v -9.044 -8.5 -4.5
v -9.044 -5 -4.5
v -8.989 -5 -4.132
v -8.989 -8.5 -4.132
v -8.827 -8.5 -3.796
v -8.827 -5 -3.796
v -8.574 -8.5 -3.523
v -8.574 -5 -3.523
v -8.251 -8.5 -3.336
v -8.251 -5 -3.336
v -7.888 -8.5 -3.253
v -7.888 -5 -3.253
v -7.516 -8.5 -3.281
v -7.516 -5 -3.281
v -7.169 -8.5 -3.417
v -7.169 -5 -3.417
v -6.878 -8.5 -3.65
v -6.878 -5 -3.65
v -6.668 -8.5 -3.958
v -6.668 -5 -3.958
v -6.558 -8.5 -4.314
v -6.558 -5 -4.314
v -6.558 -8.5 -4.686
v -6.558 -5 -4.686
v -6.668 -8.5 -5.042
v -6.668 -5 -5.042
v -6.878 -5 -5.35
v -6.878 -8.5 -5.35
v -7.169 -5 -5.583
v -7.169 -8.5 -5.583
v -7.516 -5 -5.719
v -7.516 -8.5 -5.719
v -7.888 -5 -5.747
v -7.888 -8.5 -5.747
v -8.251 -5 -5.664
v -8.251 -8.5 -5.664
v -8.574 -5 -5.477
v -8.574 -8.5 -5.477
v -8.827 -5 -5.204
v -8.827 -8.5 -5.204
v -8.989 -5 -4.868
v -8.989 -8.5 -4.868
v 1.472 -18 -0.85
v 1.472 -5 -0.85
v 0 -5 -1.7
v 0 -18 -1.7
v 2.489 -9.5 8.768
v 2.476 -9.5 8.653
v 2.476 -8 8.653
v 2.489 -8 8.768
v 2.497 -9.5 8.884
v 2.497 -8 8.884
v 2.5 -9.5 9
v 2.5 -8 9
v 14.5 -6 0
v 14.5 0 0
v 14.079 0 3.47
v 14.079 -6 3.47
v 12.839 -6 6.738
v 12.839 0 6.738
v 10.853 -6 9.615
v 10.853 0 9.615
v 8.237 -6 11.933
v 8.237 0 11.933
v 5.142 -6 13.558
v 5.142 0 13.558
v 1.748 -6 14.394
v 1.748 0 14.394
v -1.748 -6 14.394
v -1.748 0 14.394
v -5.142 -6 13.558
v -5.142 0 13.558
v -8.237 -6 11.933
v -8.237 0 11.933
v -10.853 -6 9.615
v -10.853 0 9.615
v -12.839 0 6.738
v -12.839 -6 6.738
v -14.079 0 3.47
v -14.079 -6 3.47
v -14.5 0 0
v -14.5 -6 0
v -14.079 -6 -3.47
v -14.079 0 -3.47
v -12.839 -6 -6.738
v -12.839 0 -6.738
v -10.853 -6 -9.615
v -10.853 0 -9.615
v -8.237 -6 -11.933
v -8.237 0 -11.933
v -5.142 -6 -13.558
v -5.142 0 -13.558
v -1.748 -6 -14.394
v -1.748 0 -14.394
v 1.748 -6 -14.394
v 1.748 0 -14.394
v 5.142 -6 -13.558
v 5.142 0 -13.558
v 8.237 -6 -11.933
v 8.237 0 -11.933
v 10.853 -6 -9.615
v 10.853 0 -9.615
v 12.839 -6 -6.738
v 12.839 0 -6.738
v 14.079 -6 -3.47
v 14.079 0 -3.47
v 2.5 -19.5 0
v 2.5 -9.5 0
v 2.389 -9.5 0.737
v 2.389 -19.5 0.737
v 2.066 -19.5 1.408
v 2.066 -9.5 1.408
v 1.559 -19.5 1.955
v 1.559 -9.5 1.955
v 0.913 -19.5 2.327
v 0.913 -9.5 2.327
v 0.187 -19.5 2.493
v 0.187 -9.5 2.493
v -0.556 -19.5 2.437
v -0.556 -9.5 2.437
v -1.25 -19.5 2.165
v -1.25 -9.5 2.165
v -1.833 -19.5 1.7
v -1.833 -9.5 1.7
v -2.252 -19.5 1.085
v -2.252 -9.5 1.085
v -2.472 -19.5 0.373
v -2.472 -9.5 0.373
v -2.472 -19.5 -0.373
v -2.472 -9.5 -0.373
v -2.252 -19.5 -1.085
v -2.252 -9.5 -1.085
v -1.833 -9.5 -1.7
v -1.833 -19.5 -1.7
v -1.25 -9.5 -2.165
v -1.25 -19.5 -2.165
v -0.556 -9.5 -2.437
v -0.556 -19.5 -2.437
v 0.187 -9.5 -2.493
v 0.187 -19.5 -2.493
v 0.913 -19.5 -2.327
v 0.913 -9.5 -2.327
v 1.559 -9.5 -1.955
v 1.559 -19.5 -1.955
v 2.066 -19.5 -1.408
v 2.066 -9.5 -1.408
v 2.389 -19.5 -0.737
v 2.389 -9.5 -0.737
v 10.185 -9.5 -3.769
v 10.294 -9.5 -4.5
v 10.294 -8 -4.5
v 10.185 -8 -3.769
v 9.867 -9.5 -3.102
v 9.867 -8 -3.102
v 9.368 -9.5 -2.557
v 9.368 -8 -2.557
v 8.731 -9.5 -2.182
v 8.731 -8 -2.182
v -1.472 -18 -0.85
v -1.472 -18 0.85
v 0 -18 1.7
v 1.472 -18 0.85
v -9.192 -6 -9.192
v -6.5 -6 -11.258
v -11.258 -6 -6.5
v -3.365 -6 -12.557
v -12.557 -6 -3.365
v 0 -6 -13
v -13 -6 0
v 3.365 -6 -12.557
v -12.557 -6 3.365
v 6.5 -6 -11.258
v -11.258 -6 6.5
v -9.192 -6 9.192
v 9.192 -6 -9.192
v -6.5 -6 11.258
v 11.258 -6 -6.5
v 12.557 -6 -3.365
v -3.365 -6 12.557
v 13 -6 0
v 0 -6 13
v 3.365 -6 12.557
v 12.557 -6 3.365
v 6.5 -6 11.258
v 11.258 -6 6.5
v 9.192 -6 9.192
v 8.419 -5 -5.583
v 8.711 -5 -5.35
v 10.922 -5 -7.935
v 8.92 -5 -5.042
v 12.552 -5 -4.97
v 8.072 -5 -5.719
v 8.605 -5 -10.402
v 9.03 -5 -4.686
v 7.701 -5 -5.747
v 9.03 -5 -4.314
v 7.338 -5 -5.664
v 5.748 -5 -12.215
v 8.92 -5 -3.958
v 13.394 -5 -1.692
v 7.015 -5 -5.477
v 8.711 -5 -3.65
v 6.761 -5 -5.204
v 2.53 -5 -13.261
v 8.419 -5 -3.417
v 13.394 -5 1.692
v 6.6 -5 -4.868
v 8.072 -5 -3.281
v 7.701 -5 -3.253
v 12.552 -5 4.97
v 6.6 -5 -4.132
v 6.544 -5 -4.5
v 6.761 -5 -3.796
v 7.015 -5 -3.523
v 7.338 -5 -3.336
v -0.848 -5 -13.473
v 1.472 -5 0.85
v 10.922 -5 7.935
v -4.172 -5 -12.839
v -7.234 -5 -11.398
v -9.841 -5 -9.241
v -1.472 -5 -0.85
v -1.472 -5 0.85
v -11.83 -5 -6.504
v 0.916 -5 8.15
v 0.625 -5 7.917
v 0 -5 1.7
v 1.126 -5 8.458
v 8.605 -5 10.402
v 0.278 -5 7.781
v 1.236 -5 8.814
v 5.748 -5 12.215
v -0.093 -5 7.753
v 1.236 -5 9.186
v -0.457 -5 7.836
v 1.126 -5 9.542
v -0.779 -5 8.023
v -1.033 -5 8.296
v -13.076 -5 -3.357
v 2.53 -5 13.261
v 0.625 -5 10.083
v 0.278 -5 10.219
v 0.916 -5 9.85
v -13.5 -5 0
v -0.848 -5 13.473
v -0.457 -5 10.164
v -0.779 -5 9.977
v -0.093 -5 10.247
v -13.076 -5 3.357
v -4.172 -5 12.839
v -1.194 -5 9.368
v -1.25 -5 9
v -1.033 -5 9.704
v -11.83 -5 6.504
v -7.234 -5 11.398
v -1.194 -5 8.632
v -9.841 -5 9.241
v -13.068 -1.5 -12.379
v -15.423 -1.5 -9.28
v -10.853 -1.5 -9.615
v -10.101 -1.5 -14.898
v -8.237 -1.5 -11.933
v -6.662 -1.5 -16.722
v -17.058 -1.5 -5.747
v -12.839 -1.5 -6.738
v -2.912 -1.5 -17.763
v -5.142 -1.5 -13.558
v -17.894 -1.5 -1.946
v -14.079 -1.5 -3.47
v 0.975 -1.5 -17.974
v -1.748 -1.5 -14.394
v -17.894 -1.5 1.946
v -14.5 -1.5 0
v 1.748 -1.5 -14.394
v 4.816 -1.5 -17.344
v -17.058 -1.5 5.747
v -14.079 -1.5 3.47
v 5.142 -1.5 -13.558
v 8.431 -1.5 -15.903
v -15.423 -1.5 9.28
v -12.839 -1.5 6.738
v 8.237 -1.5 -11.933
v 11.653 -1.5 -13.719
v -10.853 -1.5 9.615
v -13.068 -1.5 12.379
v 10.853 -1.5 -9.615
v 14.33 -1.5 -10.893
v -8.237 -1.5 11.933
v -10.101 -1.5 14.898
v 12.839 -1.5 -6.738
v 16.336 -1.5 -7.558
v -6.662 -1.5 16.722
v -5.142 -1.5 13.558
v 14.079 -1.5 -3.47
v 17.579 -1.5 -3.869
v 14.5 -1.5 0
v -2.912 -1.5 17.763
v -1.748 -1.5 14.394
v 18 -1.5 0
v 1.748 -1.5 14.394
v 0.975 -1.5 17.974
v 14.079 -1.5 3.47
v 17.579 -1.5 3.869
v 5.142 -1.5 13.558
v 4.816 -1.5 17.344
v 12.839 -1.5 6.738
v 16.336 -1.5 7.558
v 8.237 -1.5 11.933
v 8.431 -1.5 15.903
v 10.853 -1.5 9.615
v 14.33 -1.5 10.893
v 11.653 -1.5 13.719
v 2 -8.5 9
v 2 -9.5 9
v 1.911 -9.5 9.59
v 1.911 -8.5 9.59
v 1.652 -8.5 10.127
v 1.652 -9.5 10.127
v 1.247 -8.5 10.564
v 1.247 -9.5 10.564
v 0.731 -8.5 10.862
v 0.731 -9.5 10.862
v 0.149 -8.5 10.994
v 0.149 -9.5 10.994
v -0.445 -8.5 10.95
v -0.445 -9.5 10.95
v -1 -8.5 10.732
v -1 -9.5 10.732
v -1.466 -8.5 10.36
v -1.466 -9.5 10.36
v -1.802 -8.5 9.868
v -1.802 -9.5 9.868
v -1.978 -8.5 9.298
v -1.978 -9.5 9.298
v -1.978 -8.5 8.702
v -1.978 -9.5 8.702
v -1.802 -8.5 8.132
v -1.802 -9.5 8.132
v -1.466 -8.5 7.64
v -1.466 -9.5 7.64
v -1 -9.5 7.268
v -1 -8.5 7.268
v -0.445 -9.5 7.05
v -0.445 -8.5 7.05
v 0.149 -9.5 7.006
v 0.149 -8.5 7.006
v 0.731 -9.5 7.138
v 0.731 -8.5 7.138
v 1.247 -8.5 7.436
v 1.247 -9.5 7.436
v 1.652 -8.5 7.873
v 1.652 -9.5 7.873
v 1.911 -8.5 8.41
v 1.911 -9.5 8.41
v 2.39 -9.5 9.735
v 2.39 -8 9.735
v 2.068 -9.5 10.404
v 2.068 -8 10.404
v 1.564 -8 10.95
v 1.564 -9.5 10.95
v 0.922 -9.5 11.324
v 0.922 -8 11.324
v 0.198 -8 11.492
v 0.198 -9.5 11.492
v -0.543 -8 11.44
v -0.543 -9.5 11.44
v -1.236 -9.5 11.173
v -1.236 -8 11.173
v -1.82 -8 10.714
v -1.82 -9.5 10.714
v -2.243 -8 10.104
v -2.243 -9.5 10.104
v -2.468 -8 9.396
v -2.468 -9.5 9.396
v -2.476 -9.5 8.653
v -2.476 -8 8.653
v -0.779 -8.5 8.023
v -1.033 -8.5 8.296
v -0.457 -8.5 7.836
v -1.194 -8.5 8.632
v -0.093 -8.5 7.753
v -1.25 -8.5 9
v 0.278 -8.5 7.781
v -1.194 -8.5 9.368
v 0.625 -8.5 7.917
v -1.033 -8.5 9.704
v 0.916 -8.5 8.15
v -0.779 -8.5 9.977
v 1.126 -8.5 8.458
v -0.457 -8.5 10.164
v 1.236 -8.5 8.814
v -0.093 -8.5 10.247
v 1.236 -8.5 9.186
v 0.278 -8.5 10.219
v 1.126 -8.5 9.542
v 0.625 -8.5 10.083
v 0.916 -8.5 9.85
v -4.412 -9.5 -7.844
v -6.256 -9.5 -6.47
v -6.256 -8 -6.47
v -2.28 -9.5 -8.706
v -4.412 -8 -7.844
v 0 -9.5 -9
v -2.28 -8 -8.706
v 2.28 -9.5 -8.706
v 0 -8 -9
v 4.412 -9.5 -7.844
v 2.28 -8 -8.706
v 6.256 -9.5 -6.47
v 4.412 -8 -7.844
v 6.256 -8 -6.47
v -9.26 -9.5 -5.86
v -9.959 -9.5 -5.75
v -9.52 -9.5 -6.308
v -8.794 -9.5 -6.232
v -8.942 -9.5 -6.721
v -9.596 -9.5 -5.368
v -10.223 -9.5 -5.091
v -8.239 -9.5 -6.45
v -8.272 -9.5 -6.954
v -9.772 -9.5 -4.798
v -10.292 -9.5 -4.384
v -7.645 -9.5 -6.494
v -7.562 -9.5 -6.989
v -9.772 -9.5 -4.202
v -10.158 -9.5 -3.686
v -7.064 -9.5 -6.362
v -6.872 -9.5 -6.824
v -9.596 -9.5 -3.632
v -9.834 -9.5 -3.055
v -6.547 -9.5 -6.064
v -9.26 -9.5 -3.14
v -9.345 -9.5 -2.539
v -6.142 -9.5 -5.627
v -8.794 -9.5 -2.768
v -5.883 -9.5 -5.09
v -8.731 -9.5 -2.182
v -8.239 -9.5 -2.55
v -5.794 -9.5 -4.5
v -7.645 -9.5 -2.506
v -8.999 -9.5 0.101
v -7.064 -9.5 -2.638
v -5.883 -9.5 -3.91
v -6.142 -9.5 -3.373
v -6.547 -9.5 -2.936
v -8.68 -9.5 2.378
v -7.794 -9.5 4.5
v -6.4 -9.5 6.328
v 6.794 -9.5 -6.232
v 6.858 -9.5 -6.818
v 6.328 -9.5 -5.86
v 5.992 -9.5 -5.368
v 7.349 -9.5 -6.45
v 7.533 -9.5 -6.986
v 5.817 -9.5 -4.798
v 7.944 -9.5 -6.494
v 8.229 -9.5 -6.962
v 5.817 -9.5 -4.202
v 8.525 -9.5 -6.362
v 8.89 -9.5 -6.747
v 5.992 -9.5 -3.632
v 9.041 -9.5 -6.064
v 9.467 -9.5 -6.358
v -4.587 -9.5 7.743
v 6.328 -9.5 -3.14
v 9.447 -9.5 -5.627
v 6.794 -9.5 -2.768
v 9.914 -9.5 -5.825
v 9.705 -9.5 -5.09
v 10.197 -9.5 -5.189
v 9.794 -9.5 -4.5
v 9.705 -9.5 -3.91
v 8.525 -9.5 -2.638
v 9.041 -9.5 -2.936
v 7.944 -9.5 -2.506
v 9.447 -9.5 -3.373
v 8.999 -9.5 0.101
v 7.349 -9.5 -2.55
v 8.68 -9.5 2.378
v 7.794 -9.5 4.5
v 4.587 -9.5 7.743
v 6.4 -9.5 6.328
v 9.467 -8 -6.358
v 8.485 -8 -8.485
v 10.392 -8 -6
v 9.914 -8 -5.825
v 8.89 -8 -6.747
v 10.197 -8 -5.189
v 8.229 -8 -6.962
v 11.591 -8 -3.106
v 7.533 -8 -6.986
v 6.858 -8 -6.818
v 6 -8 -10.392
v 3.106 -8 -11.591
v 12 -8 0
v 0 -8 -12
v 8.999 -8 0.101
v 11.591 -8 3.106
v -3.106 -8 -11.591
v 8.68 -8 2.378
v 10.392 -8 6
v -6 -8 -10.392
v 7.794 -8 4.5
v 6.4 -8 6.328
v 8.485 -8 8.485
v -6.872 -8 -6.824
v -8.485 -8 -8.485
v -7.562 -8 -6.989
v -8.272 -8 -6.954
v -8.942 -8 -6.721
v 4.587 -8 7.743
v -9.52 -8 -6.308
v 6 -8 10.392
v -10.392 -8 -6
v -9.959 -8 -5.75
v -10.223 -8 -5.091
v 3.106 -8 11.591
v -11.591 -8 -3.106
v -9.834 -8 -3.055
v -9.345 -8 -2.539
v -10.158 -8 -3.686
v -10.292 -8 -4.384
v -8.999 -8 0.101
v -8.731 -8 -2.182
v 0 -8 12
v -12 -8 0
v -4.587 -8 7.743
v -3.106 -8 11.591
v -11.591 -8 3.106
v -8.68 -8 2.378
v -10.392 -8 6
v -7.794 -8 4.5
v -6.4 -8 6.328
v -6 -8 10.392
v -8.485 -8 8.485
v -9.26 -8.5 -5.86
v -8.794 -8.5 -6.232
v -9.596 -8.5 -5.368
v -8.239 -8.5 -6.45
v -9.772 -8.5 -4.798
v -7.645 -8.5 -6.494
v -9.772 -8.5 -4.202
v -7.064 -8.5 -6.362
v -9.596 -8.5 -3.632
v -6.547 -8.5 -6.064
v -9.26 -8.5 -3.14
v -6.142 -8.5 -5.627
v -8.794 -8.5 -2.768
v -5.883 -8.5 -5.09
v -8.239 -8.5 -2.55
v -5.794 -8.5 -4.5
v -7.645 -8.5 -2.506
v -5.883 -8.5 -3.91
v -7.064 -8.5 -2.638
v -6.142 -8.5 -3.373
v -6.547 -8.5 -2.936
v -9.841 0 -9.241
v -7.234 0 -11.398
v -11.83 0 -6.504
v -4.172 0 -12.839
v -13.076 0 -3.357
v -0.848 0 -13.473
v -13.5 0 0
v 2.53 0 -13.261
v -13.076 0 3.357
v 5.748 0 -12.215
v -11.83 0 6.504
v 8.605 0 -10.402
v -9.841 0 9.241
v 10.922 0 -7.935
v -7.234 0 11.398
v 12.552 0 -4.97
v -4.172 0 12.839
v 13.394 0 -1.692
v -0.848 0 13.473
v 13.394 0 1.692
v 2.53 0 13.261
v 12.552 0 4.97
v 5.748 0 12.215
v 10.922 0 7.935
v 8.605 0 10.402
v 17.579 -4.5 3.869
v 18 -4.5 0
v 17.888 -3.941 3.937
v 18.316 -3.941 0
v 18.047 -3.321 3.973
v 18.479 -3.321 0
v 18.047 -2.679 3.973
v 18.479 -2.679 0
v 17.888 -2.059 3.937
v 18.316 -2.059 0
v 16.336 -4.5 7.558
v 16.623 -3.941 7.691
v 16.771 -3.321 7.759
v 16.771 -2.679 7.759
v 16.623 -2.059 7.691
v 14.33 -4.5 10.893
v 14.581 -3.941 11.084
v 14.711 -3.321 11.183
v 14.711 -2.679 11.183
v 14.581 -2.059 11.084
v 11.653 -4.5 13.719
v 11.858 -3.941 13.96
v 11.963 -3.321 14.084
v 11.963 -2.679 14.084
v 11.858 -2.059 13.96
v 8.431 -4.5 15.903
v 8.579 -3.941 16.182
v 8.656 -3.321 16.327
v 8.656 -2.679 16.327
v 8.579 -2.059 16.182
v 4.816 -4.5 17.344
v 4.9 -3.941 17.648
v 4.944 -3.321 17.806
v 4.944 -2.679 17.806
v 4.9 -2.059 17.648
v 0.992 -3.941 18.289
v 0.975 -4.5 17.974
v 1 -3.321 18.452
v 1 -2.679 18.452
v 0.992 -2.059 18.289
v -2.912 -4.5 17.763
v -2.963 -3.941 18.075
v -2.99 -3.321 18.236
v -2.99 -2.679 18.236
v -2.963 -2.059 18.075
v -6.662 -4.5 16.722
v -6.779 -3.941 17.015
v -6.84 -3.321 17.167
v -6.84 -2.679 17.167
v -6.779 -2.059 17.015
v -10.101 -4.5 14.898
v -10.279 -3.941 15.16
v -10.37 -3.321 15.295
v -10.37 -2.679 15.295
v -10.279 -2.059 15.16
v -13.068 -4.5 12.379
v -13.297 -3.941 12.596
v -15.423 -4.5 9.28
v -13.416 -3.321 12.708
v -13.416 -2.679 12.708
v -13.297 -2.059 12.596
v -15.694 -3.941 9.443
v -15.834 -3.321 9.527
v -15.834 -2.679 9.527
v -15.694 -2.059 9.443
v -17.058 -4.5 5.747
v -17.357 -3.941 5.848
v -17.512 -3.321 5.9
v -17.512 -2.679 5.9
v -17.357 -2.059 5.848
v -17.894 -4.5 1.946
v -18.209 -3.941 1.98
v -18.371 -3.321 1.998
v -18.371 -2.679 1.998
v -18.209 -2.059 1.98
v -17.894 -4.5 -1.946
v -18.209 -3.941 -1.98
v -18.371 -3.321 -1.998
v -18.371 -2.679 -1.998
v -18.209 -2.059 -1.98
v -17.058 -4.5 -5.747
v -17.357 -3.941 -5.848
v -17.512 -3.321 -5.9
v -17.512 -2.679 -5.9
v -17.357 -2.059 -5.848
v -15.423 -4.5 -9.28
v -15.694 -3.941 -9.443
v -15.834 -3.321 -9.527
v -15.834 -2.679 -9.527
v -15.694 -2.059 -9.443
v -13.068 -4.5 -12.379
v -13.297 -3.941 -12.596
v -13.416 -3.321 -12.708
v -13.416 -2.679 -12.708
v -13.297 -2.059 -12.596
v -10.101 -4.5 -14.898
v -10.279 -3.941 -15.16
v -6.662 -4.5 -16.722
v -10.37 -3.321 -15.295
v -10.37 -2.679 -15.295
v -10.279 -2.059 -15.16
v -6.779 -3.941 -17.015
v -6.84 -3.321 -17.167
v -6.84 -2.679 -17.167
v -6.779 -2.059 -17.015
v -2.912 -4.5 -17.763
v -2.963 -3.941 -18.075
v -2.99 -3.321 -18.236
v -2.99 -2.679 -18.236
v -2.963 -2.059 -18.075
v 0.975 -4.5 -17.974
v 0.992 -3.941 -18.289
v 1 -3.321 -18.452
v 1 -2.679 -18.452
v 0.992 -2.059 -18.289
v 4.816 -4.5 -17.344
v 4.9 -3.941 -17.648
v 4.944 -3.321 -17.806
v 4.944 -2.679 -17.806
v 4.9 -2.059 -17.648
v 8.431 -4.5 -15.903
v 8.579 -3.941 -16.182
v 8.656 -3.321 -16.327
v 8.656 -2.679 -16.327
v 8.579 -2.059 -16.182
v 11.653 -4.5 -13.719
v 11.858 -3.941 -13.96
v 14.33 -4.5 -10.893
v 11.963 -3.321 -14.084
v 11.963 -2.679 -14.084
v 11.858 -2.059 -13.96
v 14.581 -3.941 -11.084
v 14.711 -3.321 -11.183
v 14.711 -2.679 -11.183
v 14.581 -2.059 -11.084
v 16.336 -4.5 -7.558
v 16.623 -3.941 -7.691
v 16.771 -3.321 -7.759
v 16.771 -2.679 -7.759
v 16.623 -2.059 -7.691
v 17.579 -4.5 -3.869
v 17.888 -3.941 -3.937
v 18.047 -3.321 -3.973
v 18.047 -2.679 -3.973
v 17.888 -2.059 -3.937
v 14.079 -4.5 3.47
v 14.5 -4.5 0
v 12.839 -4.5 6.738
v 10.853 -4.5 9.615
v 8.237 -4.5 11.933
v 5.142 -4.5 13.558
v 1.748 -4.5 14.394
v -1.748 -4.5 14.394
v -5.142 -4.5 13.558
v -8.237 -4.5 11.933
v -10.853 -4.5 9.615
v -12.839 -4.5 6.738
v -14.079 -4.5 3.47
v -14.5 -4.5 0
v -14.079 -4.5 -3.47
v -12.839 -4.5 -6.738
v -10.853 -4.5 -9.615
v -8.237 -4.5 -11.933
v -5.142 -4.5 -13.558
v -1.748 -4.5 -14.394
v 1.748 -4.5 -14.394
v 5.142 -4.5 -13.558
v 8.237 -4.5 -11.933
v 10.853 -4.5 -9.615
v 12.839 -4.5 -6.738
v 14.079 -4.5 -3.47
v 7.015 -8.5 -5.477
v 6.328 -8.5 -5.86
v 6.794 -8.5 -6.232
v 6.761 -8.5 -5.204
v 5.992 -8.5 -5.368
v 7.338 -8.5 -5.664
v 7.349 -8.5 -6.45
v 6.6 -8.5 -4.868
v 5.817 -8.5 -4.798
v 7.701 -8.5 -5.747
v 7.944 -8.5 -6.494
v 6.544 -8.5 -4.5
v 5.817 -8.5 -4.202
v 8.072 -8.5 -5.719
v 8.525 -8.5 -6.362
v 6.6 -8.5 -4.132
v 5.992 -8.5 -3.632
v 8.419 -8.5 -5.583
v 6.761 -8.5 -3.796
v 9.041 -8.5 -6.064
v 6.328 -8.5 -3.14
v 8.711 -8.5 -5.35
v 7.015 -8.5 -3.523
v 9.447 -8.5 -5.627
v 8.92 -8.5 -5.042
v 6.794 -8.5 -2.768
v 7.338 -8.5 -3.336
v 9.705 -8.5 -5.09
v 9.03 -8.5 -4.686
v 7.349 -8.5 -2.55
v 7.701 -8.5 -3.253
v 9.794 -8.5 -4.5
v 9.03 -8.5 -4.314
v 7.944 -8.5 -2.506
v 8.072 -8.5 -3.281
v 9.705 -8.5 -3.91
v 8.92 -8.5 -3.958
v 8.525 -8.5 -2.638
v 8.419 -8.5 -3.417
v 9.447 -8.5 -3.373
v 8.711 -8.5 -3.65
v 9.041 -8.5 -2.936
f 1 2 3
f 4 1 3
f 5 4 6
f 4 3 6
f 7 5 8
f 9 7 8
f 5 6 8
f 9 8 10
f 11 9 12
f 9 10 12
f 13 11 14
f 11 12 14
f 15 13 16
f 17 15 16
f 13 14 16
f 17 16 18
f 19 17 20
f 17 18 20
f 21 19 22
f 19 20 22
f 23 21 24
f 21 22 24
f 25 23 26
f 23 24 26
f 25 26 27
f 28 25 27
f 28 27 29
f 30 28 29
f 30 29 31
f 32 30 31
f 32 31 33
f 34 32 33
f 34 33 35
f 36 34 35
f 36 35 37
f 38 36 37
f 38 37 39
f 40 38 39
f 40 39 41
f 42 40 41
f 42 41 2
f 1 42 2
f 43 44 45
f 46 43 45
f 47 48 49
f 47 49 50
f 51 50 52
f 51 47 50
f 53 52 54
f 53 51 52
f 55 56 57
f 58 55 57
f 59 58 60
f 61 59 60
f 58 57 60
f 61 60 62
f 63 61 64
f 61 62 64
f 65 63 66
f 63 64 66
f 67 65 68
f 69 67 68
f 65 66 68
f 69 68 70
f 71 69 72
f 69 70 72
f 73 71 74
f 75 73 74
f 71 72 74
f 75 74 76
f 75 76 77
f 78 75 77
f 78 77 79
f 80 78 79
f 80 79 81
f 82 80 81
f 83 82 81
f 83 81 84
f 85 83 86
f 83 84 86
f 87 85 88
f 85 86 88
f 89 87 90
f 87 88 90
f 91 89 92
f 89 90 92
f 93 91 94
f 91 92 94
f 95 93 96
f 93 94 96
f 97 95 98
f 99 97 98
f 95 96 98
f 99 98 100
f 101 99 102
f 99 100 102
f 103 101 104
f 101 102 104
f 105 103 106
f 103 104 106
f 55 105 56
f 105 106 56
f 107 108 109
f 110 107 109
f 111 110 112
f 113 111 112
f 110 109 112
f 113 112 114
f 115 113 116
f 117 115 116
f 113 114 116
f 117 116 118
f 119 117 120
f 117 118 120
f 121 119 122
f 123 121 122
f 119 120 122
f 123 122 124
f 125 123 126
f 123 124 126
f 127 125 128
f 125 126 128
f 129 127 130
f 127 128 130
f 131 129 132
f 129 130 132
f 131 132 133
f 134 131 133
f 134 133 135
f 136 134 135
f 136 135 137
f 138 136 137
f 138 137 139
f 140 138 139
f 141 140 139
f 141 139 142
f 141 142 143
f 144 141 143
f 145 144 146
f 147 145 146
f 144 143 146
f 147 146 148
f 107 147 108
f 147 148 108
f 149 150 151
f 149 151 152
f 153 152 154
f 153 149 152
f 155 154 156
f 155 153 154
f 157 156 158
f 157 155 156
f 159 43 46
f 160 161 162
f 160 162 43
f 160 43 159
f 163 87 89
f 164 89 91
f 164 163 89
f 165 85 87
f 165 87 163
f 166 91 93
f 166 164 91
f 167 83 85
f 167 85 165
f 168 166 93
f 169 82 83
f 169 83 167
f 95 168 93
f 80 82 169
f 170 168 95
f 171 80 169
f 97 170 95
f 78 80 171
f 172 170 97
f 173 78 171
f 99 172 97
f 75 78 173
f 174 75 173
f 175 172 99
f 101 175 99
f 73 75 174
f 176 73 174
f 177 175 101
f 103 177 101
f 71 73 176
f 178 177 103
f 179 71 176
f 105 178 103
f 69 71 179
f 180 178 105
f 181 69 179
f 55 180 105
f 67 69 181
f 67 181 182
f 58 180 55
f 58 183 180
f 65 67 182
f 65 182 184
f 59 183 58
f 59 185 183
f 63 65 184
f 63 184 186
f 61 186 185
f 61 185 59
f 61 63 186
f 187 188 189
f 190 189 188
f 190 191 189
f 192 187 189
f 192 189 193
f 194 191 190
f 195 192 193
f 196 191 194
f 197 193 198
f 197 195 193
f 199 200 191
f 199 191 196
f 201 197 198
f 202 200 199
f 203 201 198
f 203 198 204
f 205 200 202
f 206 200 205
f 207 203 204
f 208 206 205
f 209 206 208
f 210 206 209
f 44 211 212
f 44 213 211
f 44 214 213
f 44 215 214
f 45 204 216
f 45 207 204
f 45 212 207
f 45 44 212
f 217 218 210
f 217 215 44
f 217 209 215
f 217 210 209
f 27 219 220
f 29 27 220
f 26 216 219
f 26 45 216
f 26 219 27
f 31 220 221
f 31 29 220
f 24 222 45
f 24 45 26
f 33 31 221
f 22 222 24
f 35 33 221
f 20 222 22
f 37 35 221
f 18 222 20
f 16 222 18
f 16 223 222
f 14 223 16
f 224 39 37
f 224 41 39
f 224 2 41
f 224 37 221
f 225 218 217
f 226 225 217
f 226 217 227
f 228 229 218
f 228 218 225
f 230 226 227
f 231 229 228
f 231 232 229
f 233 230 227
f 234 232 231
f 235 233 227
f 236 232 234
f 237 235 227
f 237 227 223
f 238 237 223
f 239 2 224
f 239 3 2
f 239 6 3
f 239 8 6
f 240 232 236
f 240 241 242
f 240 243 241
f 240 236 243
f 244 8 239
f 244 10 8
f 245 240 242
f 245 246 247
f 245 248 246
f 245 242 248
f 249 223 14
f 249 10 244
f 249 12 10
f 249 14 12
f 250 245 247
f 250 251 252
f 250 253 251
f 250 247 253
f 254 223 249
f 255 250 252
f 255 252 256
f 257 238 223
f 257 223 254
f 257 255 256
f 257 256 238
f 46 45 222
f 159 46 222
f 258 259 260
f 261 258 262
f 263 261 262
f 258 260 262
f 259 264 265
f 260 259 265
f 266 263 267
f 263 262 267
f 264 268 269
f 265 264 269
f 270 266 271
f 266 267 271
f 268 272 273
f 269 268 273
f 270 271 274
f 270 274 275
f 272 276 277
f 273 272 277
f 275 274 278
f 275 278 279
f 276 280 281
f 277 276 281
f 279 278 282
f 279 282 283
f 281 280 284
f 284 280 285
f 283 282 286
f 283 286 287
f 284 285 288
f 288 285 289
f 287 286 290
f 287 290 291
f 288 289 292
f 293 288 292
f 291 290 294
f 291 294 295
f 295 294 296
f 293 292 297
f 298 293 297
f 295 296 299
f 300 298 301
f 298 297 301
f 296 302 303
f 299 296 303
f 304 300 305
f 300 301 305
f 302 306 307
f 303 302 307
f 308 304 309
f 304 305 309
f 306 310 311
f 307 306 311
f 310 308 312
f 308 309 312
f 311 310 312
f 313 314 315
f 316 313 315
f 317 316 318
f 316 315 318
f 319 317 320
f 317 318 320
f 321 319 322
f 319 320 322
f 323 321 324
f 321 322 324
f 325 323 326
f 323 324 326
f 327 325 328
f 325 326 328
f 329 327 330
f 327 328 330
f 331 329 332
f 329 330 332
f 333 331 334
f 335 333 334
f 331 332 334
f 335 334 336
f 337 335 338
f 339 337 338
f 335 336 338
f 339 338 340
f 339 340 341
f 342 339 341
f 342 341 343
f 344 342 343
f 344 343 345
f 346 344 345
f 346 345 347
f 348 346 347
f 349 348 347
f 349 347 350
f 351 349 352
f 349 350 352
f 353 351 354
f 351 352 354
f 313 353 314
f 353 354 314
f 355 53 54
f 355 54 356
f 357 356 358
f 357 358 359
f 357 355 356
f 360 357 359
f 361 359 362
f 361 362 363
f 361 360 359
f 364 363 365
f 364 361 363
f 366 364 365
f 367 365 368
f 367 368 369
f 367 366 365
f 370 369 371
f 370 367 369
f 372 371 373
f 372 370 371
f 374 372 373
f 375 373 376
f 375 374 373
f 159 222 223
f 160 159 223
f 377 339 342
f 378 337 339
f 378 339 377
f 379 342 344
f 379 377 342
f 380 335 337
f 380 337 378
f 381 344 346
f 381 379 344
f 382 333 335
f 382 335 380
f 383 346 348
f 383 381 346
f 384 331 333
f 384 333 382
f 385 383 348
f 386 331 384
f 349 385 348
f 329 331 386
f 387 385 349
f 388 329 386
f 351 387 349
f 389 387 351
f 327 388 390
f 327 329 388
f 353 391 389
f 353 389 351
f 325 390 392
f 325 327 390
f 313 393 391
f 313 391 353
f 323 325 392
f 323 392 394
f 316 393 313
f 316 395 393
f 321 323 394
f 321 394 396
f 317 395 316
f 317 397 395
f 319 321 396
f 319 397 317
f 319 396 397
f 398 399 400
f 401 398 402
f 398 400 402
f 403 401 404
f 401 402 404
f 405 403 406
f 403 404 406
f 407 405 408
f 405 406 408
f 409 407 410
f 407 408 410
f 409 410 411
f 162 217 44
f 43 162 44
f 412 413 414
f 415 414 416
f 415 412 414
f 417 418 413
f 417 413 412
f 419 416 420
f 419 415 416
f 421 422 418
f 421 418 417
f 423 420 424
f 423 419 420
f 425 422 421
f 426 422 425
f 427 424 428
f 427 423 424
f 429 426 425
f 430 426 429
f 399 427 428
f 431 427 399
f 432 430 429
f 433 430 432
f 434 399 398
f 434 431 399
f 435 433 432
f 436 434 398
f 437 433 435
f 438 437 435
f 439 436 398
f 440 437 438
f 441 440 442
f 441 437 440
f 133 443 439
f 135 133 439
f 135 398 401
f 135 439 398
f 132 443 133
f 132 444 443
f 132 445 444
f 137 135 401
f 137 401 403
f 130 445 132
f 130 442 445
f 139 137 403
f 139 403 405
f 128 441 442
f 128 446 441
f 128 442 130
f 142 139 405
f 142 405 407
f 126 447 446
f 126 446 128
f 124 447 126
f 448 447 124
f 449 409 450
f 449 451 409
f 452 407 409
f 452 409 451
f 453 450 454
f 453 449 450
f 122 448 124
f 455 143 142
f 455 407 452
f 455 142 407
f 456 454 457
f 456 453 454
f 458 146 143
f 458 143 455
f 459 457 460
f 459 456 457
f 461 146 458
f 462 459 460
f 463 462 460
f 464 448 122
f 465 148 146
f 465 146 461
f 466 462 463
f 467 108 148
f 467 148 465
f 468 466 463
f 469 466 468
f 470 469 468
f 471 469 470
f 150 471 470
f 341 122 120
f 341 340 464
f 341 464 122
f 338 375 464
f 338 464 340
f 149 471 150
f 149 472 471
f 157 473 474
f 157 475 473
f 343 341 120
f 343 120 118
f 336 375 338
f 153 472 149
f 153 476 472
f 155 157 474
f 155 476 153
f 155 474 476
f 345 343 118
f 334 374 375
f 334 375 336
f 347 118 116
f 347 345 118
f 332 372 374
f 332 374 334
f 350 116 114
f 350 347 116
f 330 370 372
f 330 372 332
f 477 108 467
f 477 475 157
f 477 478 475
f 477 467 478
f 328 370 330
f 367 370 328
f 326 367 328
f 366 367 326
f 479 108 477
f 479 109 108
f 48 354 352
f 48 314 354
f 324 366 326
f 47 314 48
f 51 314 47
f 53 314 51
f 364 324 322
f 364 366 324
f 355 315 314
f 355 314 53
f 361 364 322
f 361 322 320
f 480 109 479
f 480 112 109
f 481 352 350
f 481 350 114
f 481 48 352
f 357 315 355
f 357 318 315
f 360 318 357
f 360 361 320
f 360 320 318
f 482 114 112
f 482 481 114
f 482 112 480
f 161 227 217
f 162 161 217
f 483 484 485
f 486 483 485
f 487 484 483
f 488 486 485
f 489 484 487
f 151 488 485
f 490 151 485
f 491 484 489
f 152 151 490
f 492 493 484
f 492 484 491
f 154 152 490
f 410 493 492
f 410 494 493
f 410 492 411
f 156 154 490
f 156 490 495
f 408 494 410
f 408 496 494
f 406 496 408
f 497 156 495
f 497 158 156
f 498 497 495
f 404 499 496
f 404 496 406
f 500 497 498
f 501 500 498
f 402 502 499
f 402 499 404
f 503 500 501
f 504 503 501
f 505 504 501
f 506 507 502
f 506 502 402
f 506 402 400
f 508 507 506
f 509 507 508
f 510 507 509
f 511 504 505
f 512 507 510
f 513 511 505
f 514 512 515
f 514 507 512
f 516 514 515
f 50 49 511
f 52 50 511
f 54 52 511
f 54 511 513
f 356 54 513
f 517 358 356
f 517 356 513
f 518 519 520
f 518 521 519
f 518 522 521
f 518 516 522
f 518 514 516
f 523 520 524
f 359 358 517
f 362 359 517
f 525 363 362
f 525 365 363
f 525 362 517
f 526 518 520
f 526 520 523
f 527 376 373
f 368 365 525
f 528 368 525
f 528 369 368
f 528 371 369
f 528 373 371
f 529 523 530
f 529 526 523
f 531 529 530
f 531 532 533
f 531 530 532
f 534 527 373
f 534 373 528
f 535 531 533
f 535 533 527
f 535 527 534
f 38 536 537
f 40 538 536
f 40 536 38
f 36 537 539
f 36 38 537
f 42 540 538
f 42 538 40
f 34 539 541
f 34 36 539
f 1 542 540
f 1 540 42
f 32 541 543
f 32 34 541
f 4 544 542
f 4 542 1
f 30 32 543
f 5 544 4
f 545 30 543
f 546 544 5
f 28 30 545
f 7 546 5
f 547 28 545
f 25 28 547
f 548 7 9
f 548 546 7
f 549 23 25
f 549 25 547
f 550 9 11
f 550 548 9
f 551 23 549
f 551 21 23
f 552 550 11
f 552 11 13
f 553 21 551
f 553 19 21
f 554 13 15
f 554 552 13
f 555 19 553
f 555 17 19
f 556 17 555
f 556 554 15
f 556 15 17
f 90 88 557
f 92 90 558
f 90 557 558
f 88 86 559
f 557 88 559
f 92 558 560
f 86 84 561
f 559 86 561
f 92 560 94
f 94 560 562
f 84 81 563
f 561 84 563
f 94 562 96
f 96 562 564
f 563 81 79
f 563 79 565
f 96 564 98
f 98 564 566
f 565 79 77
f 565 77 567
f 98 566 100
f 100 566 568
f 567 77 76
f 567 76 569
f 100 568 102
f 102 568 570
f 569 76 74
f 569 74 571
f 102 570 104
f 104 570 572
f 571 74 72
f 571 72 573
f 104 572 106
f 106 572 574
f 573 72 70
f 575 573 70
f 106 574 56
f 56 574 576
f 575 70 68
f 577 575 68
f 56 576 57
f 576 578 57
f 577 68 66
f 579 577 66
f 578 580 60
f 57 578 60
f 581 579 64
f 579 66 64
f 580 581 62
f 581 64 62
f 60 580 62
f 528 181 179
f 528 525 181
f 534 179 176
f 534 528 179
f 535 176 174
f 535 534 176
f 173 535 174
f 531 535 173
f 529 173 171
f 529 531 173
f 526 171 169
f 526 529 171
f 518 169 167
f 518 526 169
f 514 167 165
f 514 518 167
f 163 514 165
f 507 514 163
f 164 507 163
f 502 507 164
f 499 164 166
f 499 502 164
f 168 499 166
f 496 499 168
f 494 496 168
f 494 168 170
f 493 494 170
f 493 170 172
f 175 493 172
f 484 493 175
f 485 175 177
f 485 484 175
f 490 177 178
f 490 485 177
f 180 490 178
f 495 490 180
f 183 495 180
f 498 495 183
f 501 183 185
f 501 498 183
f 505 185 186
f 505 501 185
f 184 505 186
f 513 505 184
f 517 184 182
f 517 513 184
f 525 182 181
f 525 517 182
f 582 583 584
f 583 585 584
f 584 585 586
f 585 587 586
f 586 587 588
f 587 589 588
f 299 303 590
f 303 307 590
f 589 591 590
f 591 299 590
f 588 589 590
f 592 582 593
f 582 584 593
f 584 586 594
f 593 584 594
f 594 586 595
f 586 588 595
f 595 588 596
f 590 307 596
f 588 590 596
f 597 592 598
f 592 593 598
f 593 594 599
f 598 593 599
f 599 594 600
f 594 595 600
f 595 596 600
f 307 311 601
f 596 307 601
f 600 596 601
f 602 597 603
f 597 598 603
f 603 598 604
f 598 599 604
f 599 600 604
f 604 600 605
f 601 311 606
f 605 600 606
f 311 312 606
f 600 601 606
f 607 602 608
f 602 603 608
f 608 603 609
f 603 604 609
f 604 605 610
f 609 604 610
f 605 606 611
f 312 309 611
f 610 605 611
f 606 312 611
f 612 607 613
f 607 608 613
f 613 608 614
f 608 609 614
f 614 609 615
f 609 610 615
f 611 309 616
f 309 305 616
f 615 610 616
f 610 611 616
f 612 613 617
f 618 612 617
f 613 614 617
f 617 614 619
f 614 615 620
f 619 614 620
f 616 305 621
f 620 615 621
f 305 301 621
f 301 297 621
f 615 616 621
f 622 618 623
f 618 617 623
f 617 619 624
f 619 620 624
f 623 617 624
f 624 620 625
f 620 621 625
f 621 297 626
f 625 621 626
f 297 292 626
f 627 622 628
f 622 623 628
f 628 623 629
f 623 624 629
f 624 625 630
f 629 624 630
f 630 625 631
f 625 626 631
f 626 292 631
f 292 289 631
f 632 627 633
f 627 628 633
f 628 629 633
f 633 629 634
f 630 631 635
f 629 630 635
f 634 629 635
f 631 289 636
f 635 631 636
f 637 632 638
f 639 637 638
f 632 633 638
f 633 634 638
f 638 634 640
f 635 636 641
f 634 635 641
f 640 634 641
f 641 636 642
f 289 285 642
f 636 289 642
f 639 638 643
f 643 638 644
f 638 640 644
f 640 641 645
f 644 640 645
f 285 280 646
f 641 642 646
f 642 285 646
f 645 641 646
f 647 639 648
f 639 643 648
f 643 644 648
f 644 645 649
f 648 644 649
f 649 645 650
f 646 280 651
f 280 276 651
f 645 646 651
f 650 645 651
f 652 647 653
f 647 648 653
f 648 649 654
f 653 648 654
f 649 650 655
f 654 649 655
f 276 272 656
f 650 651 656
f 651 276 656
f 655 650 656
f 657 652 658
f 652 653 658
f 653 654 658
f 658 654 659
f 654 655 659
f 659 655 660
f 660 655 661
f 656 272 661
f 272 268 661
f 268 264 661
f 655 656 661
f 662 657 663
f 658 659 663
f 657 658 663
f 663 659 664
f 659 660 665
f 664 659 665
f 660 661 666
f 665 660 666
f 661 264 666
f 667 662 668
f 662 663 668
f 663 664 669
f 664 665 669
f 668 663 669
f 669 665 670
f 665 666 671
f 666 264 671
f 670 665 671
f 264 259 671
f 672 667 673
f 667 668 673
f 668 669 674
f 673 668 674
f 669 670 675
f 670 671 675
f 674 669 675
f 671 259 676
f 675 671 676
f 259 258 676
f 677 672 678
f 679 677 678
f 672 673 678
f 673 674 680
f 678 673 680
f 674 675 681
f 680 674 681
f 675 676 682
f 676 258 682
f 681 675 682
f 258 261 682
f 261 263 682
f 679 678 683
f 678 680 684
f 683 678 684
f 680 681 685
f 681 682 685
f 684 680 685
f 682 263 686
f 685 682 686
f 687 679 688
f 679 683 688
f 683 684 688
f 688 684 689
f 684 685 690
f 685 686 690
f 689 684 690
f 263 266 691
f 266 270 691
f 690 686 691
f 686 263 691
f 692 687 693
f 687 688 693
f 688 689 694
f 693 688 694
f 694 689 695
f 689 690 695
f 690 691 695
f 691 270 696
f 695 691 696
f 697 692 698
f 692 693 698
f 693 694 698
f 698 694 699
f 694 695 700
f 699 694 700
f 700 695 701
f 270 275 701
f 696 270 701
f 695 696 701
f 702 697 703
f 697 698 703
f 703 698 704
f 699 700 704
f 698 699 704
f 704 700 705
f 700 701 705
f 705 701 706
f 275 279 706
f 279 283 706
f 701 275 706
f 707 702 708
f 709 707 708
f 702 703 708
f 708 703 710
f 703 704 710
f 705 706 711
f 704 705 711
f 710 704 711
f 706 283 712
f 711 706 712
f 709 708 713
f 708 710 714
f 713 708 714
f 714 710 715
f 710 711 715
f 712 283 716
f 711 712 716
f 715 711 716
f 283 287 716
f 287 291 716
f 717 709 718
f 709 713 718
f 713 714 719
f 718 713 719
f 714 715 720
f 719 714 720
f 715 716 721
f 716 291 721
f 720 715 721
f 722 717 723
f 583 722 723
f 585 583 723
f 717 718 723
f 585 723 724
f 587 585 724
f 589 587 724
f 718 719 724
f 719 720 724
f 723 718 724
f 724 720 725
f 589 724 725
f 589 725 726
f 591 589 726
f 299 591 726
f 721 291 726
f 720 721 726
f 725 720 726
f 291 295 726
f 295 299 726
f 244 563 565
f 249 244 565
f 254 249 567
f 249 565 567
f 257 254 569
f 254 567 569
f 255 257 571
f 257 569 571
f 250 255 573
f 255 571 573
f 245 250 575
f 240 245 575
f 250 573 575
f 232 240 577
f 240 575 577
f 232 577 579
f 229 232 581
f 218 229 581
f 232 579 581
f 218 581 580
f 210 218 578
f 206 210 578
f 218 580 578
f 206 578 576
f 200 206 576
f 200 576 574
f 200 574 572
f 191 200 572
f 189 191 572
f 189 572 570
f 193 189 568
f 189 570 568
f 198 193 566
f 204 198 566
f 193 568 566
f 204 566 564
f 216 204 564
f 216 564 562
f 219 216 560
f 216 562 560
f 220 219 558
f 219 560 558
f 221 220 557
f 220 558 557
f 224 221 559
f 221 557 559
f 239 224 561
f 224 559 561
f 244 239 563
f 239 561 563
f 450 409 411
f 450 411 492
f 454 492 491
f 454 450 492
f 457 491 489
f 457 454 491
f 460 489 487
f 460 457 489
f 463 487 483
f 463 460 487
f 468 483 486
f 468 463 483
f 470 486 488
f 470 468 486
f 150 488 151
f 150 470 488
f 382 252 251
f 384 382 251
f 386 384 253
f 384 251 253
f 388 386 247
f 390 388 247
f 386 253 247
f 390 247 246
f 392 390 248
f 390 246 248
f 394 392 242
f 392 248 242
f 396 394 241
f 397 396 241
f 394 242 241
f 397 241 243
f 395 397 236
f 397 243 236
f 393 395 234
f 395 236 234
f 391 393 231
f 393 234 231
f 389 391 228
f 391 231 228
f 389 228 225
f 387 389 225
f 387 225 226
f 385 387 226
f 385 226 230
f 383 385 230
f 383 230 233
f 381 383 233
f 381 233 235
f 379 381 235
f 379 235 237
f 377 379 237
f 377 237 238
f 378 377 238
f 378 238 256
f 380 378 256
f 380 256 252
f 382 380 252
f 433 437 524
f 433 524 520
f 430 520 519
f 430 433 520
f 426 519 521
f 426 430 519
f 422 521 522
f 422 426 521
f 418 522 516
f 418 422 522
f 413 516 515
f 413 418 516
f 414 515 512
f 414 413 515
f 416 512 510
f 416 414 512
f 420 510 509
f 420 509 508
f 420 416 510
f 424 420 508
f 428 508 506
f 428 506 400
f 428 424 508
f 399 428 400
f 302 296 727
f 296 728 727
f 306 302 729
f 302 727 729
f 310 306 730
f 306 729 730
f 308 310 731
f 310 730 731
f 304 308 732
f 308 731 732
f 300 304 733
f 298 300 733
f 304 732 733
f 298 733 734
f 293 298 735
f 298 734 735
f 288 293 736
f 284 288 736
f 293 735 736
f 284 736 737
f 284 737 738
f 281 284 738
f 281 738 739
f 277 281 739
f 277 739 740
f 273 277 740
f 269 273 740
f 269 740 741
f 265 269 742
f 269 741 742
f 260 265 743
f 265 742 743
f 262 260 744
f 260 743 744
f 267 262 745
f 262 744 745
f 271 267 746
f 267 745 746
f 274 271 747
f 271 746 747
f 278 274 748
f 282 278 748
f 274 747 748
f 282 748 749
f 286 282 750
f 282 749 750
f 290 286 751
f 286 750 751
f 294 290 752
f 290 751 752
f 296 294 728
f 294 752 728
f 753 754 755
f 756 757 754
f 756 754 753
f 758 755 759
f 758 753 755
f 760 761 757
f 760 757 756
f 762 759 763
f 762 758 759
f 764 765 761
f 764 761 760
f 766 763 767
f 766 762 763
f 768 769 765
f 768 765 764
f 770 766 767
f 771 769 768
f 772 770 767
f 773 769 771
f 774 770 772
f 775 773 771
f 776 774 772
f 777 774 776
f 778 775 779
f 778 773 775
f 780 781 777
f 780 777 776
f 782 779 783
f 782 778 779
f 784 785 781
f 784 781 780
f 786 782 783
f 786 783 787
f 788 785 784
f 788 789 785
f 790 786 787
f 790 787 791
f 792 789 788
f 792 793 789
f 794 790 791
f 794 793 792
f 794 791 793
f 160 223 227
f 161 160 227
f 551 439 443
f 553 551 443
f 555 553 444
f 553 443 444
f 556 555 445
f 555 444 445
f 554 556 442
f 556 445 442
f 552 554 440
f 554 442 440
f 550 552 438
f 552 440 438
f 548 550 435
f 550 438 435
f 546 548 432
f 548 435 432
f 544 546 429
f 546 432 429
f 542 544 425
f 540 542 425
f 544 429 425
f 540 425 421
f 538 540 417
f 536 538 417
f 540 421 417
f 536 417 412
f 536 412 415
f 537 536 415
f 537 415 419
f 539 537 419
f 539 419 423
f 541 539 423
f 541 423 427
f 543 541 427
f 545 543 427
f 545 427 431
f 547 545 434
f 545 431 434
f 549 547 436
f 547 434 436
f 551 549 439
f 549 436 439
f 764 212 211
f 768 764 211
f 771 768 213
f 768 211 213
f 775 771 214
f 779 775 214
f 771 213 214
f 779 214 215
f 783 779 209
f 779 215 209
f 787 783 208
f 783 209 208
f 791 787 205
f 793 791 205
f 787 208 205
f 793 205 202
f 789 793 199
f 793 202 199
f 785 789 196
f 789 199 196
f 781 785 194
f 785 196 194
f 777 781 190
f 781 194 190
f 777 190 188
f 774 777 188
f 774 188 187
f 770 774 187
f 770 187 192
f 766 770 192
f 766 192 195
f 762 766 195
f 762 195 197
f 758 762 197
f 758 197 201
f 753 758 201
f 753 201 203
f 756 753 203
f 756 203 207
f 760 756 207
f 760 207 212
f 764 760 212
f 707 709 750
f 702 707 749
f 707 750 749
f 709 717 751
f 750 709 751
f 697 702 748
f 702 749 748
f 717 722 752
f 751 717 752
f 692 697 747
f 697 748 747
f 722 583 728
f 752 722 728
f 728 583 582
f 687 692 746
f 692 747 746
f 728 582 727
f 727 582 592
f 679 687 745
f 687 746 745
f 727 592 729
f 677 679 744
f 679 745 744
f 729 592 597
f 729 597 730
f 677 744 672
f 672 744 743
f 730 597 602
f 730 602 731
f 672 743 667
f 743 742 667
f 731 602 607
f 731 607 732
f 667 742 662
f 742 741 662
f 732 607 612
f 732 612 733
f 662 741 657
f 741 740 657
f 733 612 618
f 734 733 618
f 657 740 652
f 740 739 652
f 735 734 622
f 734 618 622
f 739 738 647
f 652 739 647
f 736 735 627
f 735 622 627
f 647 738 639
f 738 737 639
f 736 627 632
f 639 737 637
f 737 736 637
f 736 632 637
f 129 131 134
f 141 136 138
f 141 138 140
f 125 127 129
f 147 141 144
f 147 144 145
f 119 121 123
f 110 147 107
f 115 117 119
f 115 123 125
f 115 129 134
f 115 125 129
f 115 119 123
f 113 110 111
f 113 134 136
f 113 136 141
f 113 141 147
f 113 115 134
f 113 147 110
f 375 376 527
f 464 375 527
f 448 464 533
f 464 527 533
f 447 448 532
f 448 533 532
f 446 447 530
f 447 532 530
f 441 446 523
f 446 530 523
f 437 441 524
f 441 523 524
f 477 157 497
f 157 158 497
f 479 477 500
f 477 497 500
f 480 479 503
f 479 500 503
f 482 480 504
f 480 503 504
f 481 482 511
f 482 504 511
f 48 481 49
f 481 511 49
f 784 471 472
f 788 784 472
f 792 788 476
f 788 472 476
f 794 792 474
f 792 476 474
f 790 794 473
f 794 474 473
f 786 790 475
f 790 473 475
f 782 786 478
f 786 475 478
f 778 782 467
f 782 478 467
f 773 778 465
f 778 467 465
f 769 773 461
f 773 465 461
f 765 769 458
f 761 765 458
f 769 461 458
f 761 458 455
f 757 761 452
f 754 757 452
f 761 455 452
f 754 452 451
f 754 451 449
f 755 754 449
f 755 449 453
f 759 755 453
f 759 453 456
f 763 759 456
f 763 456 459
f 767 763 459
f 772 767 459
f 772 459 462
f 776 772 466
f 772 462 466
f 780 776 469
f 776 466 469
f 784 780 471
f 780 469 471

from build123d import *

# Parameters (mm, degrees)
F0_R      = 14.5
F1_DEPTH  = 6
F4_R      = 9
F5_DEPTH  = 1.5
F6_R      = 2.5
F7_DEPTH  = 10
F9_DEPTH  = 9
F10_R     = 13.5
F11_DEPTH = 5
F13_DEPTH = 13
F18_R     = 1.25
F19_DEPTH = 4.5
F16_R     = 2
F20_DEPTH = 1


with BuildPart() as f1:
    # F0 (on Front) → F1 (new body)
    with BuildSketch(Plane.XZ):
        Circle(F0_R)
    extrude(amount=F1_DEPTH)

    # F2 (on Right) → F3 (revolve)
    with BuildSketch(Plane.YZ):
        Polygon((-8, 0), (-6, 0), (-6, 13), (-8, 12), align=None)
    revolve(axis=Axis((0, -7, 0), (0, -1, 0)))

    # F4 (on face) → F5 (join)
    with BuildSketch(Plane.XZ.offset(8)):
        Circle(F4_R)
    extrude(amount=F5_DEPTH)

    # F6 (on face) → F7 (join)
    with BuildSketch(Plane.XZ.offset(9.5)):
        Circle(F6_R)
    extrude(amount=F7_DEPTH)

    # F8 (on face) → F9 (join)
    with BuildSketch(Plane.XZ.offset(9.5)):
        with BuildLine():
            ThreePointArc((8.731410332, -2.1823092387), (7.6201953269, -2.0060648749), (6.5442286341, -2.3349364905))
            Line((6.5442286341, -2.3349364905), (7.7942286341, -4.5))
            ThreePointArc((7.7942286341, -4.5), (8.3436867406, -3.3738541128), (8.731410332, -2.1823092387))
        make_face()
        with BuildLine():
            ThreePointArc((8.731410332, -2.1823092387), (8.3436867406, -3.3738541128), (7.7942286341, -4.5))
            ThreePointArc((7.7942286341, -4.5), (7.0936867406, -5.5389176222), (6.2556404057, -6.4704685391))
            ThreePointArc((6.2556404057, -6.4704685391), (8.8904789314, -6.7468278273), (10.2942286341, -4.5))
            ThreePointArc((10.2942286341, -4.5), (9.8670231541, -3.1023151723), (8.731410332, -2.1823092387))
        make_face()
        with BuildLine():
            ThreePointArc((6.2556404057, -6.4704685391), (7.0936867406, -5.5389176222), (7.7942286341, -4.5))
            Line((7.7942286341, -4.5), (5.2942286341, -4.5))
            ThreePointArc((5.2942286341, -4.5), (5.5474008068, -5.5962502974), (6.2556404057, -6.4704685391))
        make_face()
        with BuildLine():
            Line((7.7942286341, -4.5), (6.5442286341, -2.3349364905))
            ThreePointArc((6.5442286341, -2.3349364905), (5.6291651246, -3.25), (5.2942286341, -4.5))
            Line((5.2942286341, -4.5), (7.7942286341, -4.5))
        make_face()
        with BuildLine():
            ThreePointArc((-5.2942286341, -4.5), (-5.6291651246, -3.25), (-6.5442286341, -2.3349364905))
            Line((-6.5442286341, -2.3349364905), (-7.7942286341, -4.5))
            Line((-7.7942286341, -4.5), (-5.2942286341, -4.5))
        make_face()
        with BuildLine():
            Line((-7.7942286341, -4.5), (-6.5442286341, -2.3349364905))
            ThreePointArc((-6.5442286341, -2.3349364905), (-7.6201953269, -2.0060648749), (-8.731410332, -2.1823092387))
            ThreePointArc((-8.731410332, -2.1823092387), (-8.3436867406, -3.3738541128), (-7.7942286341, -4.5))
        make_face()
        with BuildLine():
            ThreePointArc((-7.7942286341, -4.5), (-8.3436867406, -3.3738541128), (-8.731410332, -2.1823092387))
            ThreePointArc((-8.731410332, -2.1823092387), (-9.9592921435, -5.75), (-6.2556404057, -6.4704685391))
            ThreePointArc((-6.2556404057, -6.4704685391), (-7.0936867406, -5.5389176222), (-7.7942286341, -4.5))
        make_face()
        with BuildLine():
            Line((-5.2942286341, -4.5), (-7.7942286341, -4.5))
            ThreePointArc((-7.7942286341, -4.5), (-7.0936867406, -5.5389176222), (-6.2556404057, -6.4704685391))
            ThreePointArc((-6.2556404057, -6.4704685391), (-5.5474008068, -5.5962502974), (-5.2942286341, -4.5))
        make_face()
        with BuildLine():
            Line((-1.25, 6.8349364905), (0, 9))
            ThreePointArc((0, 9), (-1.25, 8.912771735), (-2.4757699264, 8.6527777778))
            ThreePointArc((-2.4757699264, 8.6527777778), (-2.0727945201, 7.6023151723), (-1.25, 6.8349364905))
        make_face()
        with BuildLine():
            Line((1.25, 6.8349364905), (0, 9))
            Line((0, 9), (-1.25, 6.8349364905))
            ThreePointArc((-1.25, 6.8349364905), (0, 6.5), (1.25, 6.8349364905))
        make_face()
        with BuildLine():
            ThreePointArc((2.4757699264, 8.6527777778), (1.25, 8.912771735), (0, 9))
            Line((0, 9), (1.25, 6.8349364905))
            ThreePointArc((1.25, 6.8349364905), (2.0727945201, 7.6023151723), (2.4757699264, 8.6527777778))
        make_face()
        with BuildLine():
            ThreePointArc((-2.4757699264, 8.6527777778), (-1.25, 8.912771735), (0, 9))
            ThreePointArc((0, 9), (1.25, 8.912771735), (2.4757699264, 8.6527777778))
            ThreePointArc((2.4757699264, 8.6527777778), (2.4939351251, 8.8259666928), (2.5, 9))
            ThreePointArc((2.5, 9), (-0.1740333072, 11.4939351251), (-2.4757699264, 8.6527777778))
        make_face()
    extrude(amount=-F9_DEPTH)

    # F10 (on face) → F11 (cut)
    with BuildSketch(Plane(origin=(0, 0, 0), x_dir=(-1, 0, 0), z_dir=(0, 1, 0))):
        Circle(F10_R)
    extrude(amount=-F11_DEPTH, mode=Mode.SUBTRACT)

    # F12 (on face) → F13 (cut)
    with BuildSketch(Plane(origin=(0, -5, 0), x_dir=(-1, 0, 0), z_dir=(0, 1, 0))):
        Polygon((1.4722431864, 0.85), (0, 1.7), (-1.4722431864, 0.85), (-1.4722431864, -0.85), (0, -1.7), (1.4722431864, -0.85), align=None)
    extrude(amount=-F13_DEPTH, mode=Mode.SUBTRACT)

    # F18 (on face) → F19 (cut)
    with BuildSketch(Plane(origin=(0, -5, 0), x_dir=(-1, 0, 0), z_dir=(0, 1, 0))):
        with Locations((7.7942286341, -4.5)):
            Circle(F18_R)
        with Locations((0, 9)):
            Circle(F18_R)
        with Locations((-7.7942286341, -4.5)):
            Circle(F18_R)
    extrude(amount=-F19_DEPTH, mode=Mode.SUBTRACT)

    # F16 (on face) → F20 (cut)
    with BuildSketch(Plane.XZ.offset(9.5)):
        with Locations((-7.7942286341, -4.5)):
            Circle(F16_R)
        with Locations((7.7942286341, -4.5)):
            Circle(F16_R)
        with Locations((0, 9)):
            Circle(F16_R)
    extrude(amount=-F20_DEPTH, mode=Mode.SUBTRACT)


with BuildPart() as f15:
    # F14 (on Top) → F15 (revolve)
    with BuildSketch(Plane.XY):
        with BuildLine():
            Line((14.5, -1.5), (14.5, -3))
            Line((14.5, -3), (14.5, -4.5))
            Line((14.5, -4.5), (18, -4.5))
            ThreePointArc((18, -4.5), (18.5, -3), (18, -1.5))
            Line((18, -1.5), (14.5, -1.5))
        make_face()
    revolve(axis=Axis((0, -3, 0), (0, -1, 0)))


solid = Compound([f1.part, f15.part])
